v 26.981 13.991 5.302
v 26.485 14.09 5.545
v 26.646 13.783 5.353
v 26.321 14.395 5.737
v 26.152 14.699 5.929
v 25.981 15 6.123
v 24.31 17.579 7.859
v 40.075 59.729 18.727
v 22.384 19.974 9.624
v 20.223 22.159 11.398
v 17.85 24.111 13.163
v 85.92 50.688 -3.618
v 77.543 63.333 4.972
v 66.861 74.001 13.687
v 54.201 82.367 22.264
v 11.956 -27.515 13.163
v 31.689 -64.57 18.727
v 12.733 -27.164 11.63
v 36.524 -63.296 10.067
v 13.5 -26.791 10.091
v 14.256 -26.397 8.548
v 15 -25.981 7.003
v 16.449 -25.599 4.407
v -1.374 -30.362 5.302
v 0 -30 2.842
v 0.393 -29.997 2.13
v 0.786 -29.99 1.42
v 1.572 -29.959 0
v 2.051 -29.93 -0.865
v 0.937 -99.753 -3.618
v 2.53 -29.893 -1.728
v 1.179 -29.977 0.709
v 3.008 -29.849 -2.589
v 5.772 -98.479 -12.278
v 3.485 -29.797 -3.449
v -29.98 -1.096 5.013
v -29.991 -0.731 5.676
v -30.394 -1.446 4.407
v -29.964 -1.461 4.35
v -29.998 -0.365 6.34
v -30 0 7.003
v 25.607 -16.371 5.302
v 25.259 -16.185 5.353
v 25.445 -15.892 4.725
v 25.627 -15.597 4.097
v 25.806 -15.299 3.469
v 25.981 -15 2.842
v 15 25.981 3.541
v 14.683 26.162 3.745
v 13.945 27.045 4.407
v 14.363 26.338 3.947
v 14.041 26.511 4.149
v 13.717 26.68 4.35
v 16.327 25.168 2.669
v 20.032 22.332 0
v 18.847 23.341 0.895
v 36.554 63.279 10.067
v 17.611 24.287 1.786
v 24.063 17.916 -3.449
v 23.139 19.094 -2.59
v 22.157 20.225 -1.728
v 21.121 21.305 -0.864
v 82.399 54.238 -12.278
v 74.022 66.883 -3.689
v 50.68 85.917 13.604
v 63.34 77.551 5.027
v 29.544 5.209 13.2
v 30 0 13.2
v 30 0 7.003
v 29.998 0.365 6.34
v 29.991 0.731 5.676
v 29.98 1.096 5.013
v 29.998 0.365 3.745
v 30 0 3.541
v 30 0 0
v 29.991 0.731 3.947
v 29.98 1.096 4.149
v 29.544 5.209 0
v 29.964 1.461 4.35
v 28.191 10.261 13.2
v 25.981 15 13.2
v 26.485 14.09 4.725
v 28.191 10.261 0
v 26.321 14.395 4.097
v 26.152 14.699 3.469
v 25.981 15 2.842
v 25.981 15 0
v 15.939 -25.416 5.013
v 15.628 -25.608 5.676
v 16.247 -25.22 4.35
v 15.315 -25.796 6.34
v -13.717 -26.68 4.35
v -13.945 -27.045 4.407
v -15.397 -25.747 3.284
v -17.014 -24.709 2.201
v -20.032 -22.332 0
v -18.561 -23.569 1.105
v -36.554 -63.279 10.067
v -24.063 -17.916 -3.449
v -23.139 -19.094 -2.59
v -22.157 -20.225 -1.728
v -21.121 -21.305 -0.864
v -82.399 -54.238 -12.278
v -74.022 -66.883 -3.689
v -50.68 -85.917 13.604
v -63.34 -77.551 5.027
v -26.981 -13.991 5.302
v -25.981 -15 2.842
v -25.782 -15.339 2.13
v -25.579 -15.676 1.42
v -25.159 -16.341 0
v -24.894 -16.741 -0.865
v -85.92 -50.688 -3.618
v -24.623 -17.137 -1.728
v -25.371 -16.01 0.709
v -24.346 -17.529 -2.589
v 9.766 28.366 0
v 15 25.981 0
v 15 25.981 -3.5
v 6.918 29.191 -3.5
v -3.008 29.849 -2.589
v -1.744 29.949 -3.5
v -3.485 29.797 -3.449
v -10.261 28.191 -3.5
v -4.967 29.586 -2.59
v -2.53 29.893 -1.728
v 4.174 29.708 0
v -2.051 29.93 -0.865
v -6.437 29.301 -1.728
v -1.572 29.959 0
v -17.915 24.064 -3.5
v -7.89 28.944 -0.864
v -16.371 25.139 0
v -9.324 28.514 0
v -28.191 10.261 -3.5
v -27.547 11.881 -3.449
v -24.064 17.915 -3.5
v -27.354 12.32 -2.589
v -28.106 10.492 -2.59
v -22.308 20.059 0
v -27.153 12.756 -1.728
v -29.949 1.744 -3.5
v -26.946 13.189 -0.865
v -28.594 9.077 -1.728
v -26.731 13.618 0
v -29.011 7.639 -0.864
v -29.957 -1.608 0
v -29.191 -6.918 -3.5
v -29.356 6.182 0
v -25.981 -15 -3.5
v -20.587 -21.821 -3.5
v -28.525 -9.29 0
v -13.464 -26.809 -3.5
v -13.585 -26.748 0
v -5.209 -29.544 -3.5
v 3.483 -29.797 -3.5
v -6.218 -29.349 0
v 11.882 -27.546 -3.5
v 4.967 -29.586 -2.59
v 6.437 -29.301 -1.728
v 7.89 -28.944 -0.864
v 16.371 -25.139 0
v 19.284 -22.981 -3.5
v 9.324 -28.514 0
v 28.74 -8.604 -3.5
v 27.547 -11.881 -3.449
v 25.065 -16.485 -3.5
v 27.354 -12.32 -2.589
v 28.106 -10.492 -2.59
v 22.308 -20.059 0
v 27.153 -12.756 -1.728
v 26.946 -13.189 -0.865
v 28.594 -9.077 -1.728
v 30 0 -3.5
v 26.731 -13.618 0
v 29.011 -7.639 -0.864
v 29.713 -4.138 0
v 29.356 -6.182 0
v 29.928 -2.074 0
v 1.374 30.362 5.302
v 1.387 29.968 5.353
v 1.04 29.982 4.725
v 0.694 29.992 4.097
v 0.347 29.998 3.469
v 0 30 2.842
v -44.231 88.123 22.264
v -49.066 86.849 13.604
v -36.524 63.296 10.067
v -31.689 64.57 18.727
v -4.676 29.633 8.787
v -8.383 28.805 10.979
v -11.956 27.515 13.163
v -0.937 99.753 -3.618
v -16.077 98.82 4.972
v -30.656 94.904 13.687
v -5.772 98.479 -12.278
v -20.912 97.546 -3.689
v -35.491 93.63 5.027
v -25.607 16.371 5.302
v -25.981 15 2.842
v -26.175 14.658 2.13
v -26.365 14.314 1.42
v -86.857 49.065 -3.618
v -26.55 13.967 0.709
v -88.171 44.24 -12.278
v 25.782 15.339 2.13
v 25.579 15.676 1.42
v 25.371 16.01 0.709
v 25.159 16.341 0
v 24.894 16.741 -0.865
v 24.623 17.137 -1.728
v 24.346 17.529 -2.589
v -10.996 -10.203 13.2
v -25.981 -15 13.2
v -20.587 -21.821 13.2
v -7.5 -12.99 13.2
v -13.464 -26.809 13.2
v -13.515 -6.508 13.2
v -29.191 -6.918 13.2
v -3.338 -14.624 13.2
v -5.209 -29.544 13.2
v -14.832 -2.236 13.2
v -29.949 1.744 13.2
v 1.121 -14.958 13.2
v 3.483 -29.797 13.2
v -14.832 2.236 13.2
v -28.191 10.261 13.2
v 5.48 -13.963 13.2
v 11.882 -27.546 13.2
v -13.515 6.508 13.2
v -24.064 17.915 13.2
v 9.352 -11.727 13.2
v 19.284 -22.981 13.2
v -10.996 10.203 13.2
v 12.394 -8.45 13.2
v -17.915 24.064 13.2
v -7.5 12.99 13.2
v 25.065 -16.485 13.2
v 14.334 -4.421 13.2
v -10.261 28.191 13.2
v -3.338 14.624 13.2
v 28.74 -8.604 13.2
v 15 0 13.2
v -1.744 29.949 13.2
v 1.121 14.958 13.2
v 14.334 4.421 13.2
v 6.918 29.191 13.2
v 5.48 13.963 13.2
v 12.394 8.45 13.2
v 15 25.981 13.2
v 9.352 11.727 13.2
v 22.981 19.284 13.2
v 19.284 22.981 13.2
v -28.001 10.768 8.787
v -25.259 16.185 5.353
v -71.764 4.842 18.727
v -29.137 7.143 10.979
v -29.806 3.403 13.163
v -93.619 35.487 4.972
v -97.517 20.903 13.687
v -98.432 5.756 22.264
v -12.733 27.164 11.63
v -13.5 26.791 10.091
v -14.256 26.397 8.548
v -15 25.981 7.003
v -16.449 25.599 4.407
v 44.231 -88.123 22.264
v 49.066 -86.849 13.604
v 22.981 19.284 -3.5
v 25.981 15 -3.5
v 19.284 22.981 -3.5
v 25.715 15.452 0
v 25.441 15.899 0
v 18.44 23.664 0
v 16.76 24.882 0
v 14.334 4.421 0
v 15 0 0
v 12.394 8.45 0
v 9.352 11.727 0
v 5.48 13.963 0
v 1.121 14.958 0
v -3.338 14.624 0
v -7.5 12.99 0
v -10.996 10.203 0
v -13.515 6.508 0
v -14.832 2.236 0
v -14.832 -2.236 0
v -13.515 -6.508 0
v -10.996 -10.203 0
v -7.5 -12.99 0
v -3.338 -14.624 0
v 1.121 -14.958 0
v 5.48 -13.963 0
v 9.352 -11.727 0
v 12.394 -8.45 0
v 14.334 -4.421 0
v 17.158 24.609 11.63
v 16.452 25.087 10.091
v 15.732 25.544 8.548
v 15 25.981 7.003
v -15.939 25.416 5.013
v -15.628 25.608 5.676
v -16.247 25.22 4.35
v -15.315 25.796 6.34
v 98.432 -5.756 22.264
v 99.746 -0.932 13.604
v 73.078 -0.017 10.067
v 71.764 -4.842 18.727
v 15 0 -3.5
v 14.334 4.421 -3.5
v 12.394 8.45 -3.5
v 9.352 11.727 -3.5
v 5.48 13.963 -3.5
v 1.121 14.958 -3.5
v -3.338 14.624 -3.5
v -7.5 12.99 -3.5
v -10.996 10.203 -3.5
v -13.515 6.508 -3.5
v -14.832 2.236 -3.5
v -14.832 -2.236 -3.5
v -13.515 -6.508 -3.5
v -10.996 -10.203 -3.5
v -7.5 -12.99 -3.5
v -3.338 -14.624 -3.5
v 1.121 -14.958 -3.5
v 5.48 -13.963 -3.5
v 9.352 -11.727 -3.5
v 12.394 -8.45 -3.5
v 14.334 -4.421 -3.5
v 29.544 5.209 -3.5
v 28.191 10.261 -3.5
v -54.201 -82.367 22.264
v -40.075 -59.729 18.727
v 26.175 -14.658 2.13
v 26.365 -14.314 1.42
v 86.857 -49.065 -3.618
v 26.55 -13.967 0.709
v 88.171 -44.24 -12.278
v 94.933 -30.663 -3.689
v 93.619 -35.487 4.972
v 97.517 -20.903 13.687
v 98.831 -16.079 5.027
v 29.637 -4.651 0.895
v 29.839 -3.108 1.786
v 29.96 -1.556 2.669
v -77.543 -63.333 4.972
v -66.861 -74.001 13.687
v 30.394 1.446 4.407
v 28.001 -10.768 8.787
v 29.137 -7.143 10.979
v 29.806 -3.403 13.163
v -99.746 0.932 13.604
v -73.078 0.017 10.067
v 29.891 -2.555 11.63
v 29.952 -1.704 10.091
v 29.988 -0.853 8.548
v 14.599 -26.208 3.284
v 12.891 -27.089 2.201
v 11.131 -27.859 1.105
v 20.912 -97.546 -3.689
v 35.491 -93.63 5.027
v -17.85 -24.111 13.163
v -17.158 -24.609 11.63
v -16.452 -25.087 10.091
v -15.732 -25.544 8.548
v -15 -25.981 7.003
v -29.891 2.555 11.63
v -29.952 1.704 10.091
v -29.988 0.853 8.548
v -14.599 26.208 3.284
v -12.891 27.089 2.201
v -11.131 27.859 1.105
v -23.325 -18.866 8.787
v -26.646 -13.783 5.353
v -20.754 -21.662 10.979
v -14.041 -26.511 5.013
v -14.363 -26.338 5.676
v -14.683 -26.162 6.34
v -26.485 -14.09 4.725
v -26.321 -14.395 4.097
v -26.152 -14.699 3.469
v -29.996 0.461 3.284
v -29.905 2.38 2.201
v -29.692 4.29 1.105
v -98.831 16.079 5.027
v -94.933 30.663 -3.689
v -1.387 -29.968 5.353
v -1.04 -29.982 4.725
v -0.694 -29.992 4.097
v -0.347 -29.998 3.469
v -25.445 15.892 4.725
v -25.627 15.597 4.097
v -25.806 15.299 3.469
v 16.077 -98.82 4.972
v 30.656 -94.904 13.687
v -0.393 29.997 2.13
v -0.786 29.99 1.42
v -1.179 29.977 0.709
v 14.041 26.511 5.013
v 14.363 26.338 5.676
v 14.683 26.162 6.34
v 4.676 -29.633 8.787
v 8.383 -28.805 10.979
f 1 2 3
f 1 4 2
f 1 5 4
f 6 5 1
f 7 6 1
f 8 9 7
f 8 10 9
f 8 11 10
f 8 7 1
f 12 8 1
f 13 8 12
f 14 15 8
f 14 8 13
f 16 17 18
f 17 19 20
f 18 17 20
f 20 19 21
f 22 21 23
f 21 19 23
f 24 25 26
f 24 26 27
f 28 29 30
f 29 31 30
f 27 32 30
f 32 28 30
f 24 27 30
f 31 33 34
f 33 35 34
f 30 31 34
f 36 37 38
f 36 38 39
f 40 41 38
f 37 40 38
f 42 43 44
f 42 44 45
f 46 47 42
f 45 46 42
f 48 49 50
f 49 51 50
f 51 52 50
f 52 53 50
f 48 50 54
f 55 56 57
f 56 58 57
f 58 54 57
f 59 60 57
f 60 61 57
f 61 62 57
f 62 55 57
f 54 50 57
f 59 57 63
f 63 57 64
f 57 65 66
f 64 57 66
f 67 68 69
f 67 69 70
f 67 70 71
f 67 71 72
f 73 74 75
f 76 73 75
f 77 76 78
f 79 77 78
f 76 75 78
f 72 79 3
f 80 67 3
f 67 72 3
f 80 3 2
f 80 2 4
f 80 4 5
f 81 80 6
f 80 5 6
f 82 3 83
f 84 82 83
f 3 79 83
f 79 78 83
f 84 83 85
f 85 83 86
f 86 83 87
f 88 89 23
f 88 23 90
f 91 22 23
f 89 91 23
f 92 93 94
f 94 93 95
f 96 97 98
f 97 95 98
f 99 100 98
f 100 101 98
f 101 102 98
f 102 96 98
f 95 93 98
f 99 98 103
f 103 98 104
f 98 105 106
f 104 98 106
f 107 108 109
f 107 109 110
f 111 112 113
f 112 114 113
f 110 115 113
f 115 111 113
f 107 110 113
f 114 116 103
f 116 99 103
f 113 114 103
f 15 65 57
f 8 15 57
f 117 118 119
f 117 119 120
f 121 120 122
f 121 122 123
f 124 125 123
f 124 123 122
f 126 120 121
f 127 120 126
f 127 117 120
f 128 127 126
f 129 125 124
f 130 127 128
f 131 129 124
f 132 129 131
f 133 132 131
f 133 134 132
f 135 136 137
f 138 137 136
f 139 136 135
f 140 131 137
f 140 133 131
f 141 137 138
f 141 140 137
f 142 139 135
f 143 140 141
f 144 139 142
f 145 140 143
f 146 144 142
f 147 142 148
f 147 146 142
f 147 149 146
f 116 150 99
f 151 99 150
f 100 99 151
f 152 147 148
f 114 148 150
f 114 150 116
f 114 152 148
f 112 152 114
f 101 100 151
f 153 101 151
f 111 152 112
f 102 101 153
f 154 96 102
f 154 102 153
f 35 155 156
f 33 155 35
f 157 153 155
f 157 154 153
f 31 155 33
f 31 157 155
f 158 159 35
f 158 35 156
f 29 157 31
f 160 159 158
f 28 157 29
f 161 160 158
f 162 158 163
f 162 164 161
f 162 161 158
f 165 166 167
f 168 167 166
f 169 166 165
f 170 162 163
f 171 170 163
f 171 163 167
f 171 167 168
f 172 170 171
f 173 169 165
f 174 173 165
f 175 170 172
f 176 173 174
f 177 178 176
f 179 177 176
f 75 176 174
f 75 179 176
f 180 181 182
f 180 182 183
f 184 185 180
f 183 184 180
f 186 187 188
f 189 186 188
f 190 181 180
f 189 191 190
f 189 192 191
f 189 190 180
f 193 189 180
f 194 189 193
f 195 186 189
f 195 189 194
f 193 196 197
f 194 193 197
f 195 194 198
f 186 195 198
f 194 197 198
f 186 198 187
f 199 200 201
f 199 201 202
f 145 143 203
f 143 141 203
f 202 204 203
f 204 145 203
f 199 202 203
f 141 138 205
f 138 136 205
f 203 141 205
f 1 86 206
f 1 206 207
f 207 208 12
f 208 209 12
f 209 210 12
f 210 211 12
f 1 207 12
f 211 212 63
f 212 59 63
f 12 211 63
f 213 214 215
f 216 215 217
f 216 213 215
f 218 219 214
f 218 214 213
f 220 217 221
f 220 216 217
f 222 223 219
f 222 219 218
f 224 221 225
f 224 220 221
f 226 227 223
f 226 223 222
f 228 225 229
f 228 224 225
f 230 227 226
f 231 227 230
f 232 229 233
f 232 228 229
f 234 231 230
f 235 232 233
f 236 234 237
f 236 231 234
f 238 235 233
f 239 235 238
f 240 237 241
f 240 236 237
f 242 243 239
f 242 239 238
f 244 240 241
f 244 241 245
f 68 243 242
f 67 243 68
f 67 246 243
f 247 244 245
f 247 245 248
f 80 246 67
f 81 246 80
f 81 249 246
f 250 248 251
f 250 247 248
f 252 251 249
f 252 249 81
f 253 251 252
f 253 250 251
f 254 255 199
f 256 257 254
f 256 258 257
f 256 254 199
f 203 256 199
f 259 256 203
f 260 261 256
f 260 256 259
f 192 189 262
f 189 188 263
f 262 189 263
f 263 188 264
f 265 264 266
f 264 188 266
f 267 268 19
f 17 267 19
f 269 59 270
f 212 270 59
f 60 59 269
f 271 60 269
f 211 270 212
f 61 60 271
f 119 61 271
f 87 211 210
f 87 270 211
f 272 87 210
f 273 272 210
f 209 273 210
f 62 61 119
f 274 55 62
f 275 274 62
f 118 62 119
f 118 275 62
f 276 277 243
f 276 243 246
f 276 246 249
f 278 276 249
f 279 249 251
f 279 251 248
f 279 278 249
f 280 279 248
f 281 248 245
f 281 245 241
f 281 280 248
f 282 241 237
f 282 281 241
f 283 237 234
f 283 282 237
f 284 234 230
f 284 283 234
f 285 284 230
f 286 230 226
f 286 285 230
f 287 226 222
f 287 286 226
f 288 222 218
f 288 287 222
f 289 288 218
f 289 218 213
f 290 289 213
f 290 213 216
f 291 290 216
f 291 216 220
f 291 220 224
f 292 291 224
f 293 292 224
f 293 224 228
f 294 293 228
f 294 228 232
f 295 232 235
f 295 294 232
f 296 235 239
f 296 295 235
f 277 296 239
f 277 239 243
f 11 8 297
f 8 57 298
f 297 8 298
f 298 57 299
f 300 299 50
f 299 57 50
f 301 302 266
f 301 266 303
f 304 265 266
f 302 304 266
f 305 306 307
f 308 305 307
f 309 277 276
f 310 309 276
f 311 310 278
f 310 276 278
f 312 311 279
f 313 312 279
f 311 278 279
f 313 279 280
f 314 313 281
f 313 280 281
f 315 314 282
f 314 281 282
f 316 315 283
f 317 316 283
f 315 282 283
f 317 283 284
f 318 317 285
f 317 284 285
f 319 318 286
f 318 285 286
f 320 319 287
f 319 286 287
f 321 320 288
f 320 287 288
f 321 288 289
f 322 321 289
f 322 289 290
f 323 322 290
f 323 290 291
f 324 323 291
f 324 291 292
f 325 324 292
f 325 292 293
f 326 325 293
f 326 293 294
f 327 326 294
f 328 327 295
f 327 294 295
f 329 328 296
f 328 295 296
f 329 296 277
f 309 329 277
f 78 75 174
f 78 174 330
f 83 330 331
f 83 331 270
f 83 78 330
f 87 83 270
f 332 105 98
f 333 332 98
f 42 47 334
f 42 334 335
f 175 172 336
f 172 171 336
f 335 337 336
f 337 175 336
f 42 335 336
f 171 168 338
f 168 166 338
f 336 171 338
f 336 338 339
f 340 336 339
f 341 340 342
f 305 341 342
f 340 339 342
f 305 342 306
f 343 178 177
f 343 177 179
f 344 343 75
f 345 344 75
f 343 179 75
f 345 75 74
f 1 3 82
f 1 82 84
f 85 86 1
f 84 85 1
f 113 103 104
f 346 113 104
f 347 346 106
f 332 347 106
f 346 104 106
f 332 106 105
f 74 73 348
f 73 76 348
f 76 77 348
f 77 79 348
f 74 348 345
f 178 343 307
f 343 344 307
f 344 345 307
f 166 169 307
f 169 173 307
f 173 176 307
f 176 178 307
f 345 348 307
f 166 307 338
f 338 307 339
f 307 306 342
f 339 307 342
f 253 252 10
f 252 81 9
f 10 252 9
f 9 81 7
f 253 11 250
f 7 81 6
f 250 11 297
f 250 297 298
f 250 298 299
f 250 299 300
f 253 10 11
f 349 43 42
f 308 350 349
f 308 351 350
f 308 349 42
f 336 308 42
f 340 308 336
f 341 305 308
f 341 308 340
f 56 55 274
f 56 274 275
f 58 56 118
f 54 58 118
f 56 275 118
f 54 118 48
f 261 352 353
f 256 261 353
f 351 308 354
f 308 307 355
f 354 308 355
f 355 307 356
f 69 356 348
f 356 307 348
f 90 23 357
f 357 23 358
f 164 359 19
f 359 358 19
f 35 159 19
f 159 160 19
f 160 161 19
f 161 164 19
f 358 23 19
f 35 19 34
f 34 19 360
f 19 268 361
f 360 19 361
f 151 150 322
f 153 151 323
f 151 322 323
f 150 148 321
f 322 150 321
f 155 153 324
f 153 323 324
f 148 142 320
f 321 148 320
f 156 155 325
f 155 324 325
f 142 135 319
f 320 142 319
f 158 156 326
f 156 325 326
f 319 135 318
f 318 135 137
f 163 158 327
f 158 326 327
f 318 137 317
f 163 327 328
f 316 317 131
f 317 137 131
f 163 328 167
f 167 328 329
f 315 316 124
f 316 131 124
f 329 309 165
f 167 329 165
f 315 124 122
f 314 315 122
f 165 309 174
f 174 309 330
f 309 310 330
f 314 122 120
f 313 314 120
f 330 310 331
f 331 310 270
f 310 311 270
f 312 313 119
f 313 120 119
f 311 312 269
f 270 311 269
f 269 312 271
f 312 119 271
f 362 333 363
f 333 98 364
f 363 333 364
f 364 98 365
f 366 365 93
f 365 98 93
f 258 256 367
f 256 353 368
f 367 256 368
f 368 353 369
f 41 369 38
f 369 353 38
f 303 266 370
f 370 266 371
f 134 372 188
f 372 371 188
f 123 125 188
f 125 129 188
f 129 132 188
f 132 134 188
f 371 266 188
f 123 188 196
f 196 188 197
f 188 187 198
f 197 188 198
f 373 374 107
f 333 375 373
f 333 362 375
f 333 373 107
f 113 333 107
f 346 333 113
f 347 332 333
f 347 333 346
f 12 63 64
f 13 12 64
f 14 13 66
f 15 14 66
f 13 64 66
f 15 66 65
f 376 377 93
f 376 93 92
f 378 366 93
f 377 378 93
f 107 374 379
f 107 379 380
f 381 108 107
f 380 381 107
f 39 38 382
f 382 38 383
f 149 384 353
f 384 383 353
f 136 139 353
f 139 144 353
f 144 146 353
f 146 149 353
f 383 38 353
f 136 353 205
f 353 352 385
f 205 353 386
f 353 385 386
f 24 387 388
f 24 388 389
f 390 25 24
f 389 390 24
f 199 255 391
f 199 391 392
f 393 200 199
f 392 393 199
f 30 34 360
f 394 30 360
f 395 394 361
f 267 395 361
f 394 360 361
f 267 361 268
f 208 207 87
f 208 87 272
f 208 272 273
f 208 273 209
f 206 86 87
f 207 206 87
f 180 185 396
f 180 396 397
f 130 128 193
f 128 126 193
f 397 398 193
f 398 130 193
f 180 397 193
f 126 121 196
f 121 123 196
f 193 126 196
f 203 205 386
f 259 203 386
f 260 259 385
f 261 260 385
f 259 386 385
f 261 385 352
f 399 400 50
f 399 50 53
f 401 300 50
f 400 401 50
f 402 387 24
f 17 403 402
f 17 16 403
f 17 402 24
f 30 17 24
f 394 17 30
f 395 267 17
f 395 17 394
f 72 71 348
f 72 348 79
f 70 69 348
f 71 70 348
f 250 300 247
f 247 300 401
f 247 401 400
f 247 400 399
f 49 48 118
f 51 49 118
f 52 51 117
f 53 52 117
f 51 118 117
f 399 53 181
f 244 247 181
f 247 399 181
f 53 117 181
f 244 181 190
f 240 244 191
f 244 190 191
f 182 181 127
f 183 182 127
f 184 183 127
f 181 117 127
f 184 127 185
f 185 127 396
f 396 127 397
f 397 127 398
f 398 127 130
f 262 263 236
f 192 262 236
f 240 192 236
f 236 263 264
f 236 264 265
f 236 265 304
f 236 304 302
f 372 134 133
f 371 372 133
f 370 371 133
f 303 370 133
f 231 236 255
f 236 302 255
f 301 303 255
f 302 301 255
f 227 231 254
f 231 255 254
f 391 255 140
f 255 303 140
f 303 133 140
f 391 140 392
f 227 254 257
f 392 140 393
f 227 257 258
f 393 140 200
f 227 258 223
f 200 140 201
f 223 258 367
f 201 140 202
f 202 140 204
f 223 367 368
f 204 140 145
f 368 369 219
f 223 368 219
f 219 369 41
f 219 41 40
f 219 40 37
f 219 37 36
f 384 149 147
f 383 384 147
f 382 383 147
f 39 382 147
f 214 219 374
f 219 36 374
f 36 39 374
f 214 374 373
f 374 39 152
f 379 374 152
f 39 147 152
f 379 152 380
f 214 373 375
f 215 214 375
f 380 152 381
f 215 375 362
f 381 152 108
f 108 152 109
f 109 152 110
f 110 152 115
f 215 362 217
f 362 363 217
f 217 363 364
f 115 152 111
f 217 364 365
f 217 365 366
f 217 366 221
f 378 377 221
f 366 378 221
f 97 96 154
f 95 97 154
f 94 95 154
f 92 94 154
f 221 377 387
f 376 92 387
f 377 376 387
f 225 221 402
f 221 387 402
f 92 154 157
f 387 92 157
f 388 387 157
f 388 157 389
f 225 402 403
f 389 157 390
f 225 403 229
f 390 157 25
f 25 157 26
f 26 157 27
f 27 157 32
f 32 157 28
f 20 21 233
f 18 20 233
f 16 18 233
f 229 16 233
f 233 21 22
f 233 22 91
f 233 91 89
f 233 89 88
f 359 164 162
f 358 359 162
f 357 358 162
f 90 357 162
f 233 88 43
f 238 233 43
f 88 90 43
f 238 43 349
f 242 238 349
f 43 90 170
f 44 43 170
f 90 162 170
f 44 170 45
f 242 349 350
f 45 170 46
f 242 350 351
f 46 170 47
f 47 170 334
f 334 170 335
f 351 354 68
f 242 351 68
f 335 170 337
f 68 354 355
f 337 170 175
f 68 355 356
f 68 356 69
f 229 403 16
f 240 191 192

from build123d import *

# Parameters (mm, degrees)
F1_DEPTH      = 10
F4_ANGLE      = -30
F6_COUNT      = 6
F0_R          = 15
F7_DEPTH      = 13.2
F7_DEPTH_BACK = 3.5


with BuildPart() as f1:
    # F0 (on Top) → F1 (new body)
    with BuildSketch(Plane.XY):
        with BuildLine():
            Line((36.5413986146, 63.2915589802), (15, 25.9807621135))
            ThreePointArc((15, 25.9807621135), (21.2132034356, 21.2132034356), (25.9807621135, 15))
            Line((25.9807621135, 15), (86.6025403784, 50))
            ThreePointArc((86.6025403784, 50), (70.7106781187, 70.7106781187), (50, 86.6025403784))
            Line((50, 86.6025403784), (36.5413986146, 63.2915589802))
        make_face()
        with BuildLine():
            ThreePointArc((25.9807621135, 15), (21.2132034356, 21.2132034356), (15, 25.9807621135))
            Line((15, 25.9807621135), (10.982790001, 19.0227502905))
            ThreePointArc((10.982790001, 19.0227502905), (15.5320105721, 15.5320105721), (19.0227502905, 10.982790001))
            Line((19.0227502905, 10.982790001), (25.9807621135, 15))
        make_face()
    extrude(amount=F1_DEPTH)


with BuildPart() as f1_1:
    # F4: moved
    add(f1.part.rotate(Axis((41.835274435, 42.0708136254, 5), (-0.709996604, -0.7042050996, 0)), F4_ANGLE))


with BuildPart() as f6_1:
    # F6: instance of F1
    add(f1_1.part.rotate(Axis((0, 0, -5.4106004536), (0, 0, -1)), 1 * 360 / F6_COUNT))


with BuildPart() as f6_2:
    # F6: instance of F1
    add(f1_1.part.rotate(Axis((0, 0, -5.4106004536), (0, 0, -1)), 2 * 360 / F6_COUNT))


with BuildPart() as f6_3:
    # F6: instance of F1
    add(f1_1.part.rotate(Axis((0, 0, -5.4106004536), (0, 0, -1)), 3 * 360 / F6_COUNT))


with BuildPart() as f6_4:
    # F6: instance of F1
    add(f1_1.part.rotate(Axis((0, 0, -5.4106004536), (0, 0, -1)), 4 * 360 / F6_COUNT))


with BuildPart() as f6_5:
    # F6: instance of F1
    add(f1_1.part.rotate(Axis((0, 0, -5.4106004536), (0, 0, -1)), 5 * 360 / F6_COUNT))


with BuildPart() as f1_2:
    add(f1_1.part)

    add(f6_1.part)  # F7 merges F6_1

    add(f6_2.part)  # F7 merges F6_2

    add(f6_3.part)  # F7 merges F6_3

    add(f6_4.part)  # F7 merges F6_4

    add(f6_5.part)  # F7 merges F6_5
    # F0 (on Top) → F7 (join, two sides)
    with BuildSketch(Plane.XY) as f7_sk:
        with BuildLine():
            ThreePointArc((25.9807621135, 15), (21.2132034356, 21.2132034356), (15, 25.9807621135))
            Line((15, 25.9807621135), (10.982790001, 19.0227502905))
            ThreePointArc((10.982790001, 19.0227502905), (15.5320105721, 15.5320105721), (19.0227502905, 10.982790001))
            Line((19.0227502905, 10.982790001), (25.9807621135, 15))
        make_face()
        with BuildLine():
            Line((10.982790001, 19.0227502905), (15, 25.9807621135))
            ThreePointArc((15, 25.9807621135), (-25.9807621135, -15), (30, 0))
            ThreePointArc((30, 0), (28.9777747887, 7.7645713531), (25.9807621135, 15))
            Line((25.9807621135, 15), (19.0227502905, 10.982790001))
            ThreePointArc((19.0227502905, 10.982790001), (15.5320105721, 15.5320105721), (10.982790001, 19.0227502905))
        make_face()
        Circle(F0_R, mode=Mode.SUBTRACT)
    extrude(amount=F7_DEPTH)
    extrude(f7_sk.sketch, amount=-F7_DEPTH_BACK)


solid = f1_2.part
